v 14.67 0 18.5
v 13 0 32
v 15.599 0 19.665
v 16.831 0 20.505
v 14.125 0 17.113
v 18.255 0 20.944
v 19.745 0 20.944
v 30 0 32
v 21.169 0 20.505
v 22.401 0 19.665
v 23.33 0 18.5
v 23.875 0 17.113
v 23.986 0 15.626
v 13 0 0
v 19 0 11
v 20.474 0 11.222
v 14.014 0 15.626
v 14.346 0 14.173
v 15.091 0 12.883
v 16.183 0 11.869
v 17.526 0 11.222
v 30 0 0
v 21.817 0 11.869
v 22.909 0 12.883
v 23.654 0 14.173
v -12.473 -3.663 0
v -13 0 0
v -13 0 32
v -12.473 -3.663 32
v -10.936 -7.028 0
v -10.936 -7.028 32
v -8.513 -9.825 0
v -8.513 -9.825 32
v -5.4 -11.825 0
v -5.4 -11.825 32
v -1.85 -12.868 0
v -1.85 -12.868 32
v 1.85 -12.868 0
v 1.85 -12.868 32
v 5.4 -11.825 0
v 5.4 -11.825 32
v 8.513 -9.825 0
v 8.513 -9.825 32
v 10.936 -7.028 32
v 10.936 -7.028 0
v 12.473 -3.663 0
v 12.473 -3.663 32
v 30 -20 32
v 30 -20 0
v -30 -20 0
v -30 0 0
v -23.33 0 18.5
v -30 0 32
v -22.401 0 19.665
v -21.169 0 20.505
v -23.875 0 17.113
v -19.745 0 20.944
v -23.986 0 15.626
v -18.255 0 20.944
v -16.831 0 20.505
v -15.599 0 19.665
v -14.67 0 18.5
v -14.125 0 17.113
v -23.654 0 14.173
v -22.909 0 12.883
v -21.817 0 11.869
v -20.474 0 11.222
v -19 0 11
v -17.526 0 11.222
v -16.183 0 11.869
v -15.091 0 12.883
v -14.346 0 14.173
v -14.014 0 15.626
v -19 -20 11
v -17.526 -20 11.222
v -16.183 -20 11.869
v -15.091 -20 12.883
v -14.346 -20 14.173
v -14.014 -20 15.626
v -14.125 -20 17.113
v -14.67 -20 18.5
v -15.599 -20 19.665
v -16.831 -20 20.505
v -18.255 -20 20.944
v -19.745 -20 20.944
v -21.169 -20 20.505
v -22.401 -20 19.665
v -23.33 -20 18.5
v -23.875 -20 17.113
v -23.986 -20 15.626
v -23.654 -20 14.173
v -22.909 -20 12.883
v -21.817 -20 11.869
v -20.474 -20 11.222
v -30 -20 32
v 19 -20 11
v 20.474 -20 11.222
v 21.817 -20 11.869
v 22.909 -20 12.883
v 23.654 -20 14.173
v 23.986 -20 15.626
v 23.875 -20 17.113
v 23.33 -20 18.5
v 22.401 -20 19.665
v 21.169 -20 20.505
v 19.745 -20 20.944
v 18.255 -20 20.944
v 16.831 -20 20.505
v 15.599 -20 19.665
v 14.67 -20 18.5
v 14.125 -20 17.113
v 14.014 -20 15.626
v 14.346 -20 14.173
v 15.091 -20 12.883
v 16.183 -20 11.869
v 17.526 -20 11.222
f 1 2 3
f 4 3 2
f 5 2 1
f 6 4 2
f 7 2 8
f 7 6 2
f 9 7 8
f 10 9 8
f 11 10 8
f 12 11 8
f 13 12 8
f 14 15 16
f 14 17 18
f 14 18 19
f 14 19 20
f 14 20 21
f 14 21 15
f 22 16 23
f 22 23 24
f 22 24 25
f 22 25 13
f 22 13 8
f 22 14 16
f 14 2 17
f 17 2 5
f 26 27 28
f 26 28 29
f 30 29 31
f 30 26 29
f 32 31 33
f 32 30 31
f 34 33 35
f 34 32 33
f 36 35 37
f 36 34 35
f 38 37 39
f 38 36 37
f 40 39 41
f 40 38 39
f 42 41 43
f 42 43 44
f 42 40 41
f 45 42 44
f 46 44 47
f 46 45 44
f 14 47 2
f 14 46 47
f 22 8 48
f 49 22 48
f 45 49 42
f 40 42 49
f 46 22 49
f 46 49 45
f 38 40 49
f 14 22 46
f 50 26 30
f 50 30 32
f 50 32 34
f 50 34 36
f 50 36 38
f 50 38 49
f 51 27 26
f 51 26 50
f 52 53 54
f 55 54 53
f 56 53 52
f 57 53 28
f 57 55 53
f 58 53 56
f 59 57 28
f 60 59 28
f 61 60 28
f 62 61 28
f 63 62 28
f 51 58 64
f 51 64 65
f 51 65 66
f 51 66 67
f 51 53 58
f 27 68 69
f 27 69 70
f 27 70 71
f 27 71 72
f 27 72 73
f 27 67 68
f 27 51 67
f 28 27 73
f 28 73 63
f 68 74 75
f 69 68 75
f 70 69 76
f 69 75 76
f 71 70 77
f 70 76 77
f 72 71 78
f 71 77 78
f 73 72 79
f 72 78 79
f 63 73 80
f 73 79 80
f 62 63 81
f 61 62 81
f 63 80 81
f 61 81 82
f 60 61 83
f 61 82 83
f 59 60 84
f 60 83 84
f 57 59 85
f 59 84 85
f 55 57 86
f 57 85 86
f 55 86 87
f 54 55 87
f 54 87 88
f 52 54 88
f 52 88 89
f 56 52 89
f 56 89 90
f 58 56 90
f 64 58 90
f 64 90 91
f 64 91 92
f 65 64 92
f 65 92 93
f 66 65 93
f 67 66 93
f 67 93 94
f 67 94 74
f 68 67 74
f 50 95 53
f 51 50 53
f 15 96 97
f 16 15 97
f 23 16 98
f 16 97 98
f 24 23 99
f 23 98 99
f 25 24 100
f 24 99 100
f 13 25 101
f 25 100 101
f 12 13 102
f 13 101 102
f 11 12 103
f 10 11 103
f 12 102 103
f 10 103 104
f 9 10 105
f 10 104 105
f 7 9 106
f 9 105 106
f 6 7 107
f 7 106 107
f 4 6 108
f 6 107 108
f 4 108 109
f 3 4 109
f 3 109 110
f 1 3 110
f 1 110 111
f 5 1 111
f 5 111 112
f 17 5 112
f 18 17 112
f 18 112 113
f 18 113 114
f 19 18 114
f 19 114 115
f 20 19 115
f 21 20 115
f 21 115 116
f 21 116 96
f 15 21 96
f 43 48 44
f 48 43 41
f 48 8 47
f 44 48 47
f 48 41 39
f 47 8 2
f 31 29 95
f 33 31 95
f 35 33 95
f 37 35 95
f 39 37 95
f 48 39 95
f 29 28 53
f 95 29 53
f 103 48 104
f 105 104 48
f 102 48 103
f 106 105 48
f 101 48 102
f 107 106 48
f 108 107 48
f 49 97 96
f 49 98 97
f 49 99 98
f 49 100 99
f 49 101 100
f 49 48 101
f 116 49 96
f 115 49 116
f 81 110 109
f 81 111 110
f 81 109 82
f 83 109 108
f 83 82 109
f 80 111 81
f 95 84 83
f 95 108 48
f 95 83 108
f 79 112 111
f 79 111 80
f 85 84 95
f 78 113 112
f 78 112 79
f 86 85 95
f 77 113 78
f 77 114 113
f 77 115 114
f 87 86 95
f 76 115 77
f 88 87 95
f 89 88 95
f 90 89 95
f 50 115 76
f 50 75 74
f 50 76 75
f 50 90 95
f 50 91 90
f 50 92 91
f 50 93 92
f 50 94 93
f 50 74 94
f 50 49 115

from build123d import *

# Parameters (mm, degrees)
BOSS_EXTRUDE1_DEPTH = 32
SKETCH2_R           = 5
CUT_EXTRUDE1_DEPTH  = 32


with BuildPart() as part:
    # Sketch1 → Boss-Extrude1 (new body)
    with BuildSketch(Plane.XY):
        with BuildLine():
            Line((-30, 0), (-13, 0))
            ThreePointArc((-13, 0), (0, -13), (13, 0))
            Line((13, 0), (30, 0))
            Line((30, 0), (30, -20))
            Line((30, -20), (-30, -20))
            Line((-30, -20), (-30, 0))
        make_face()
    extrude(amount=BOSS_EXTRUDE1_DEPTH)

    # Sketch2 → Cut-Extrude1 (cut)
    with BuildSketch(Plane.XZ.offset(20)):
        with Locations(Location((-19, 16, 0), (0, 0, 270))):
            Circle(SKETCH2_R)
        with Locations(Location((19, 16, 0), (0, 0, 270))):
            Circle(SKETCH2_R)
    extrude(amount=-CUT_EXTRUDE1_DEPTH, mode=Mode.SUBTRACT)


solid = part.part
